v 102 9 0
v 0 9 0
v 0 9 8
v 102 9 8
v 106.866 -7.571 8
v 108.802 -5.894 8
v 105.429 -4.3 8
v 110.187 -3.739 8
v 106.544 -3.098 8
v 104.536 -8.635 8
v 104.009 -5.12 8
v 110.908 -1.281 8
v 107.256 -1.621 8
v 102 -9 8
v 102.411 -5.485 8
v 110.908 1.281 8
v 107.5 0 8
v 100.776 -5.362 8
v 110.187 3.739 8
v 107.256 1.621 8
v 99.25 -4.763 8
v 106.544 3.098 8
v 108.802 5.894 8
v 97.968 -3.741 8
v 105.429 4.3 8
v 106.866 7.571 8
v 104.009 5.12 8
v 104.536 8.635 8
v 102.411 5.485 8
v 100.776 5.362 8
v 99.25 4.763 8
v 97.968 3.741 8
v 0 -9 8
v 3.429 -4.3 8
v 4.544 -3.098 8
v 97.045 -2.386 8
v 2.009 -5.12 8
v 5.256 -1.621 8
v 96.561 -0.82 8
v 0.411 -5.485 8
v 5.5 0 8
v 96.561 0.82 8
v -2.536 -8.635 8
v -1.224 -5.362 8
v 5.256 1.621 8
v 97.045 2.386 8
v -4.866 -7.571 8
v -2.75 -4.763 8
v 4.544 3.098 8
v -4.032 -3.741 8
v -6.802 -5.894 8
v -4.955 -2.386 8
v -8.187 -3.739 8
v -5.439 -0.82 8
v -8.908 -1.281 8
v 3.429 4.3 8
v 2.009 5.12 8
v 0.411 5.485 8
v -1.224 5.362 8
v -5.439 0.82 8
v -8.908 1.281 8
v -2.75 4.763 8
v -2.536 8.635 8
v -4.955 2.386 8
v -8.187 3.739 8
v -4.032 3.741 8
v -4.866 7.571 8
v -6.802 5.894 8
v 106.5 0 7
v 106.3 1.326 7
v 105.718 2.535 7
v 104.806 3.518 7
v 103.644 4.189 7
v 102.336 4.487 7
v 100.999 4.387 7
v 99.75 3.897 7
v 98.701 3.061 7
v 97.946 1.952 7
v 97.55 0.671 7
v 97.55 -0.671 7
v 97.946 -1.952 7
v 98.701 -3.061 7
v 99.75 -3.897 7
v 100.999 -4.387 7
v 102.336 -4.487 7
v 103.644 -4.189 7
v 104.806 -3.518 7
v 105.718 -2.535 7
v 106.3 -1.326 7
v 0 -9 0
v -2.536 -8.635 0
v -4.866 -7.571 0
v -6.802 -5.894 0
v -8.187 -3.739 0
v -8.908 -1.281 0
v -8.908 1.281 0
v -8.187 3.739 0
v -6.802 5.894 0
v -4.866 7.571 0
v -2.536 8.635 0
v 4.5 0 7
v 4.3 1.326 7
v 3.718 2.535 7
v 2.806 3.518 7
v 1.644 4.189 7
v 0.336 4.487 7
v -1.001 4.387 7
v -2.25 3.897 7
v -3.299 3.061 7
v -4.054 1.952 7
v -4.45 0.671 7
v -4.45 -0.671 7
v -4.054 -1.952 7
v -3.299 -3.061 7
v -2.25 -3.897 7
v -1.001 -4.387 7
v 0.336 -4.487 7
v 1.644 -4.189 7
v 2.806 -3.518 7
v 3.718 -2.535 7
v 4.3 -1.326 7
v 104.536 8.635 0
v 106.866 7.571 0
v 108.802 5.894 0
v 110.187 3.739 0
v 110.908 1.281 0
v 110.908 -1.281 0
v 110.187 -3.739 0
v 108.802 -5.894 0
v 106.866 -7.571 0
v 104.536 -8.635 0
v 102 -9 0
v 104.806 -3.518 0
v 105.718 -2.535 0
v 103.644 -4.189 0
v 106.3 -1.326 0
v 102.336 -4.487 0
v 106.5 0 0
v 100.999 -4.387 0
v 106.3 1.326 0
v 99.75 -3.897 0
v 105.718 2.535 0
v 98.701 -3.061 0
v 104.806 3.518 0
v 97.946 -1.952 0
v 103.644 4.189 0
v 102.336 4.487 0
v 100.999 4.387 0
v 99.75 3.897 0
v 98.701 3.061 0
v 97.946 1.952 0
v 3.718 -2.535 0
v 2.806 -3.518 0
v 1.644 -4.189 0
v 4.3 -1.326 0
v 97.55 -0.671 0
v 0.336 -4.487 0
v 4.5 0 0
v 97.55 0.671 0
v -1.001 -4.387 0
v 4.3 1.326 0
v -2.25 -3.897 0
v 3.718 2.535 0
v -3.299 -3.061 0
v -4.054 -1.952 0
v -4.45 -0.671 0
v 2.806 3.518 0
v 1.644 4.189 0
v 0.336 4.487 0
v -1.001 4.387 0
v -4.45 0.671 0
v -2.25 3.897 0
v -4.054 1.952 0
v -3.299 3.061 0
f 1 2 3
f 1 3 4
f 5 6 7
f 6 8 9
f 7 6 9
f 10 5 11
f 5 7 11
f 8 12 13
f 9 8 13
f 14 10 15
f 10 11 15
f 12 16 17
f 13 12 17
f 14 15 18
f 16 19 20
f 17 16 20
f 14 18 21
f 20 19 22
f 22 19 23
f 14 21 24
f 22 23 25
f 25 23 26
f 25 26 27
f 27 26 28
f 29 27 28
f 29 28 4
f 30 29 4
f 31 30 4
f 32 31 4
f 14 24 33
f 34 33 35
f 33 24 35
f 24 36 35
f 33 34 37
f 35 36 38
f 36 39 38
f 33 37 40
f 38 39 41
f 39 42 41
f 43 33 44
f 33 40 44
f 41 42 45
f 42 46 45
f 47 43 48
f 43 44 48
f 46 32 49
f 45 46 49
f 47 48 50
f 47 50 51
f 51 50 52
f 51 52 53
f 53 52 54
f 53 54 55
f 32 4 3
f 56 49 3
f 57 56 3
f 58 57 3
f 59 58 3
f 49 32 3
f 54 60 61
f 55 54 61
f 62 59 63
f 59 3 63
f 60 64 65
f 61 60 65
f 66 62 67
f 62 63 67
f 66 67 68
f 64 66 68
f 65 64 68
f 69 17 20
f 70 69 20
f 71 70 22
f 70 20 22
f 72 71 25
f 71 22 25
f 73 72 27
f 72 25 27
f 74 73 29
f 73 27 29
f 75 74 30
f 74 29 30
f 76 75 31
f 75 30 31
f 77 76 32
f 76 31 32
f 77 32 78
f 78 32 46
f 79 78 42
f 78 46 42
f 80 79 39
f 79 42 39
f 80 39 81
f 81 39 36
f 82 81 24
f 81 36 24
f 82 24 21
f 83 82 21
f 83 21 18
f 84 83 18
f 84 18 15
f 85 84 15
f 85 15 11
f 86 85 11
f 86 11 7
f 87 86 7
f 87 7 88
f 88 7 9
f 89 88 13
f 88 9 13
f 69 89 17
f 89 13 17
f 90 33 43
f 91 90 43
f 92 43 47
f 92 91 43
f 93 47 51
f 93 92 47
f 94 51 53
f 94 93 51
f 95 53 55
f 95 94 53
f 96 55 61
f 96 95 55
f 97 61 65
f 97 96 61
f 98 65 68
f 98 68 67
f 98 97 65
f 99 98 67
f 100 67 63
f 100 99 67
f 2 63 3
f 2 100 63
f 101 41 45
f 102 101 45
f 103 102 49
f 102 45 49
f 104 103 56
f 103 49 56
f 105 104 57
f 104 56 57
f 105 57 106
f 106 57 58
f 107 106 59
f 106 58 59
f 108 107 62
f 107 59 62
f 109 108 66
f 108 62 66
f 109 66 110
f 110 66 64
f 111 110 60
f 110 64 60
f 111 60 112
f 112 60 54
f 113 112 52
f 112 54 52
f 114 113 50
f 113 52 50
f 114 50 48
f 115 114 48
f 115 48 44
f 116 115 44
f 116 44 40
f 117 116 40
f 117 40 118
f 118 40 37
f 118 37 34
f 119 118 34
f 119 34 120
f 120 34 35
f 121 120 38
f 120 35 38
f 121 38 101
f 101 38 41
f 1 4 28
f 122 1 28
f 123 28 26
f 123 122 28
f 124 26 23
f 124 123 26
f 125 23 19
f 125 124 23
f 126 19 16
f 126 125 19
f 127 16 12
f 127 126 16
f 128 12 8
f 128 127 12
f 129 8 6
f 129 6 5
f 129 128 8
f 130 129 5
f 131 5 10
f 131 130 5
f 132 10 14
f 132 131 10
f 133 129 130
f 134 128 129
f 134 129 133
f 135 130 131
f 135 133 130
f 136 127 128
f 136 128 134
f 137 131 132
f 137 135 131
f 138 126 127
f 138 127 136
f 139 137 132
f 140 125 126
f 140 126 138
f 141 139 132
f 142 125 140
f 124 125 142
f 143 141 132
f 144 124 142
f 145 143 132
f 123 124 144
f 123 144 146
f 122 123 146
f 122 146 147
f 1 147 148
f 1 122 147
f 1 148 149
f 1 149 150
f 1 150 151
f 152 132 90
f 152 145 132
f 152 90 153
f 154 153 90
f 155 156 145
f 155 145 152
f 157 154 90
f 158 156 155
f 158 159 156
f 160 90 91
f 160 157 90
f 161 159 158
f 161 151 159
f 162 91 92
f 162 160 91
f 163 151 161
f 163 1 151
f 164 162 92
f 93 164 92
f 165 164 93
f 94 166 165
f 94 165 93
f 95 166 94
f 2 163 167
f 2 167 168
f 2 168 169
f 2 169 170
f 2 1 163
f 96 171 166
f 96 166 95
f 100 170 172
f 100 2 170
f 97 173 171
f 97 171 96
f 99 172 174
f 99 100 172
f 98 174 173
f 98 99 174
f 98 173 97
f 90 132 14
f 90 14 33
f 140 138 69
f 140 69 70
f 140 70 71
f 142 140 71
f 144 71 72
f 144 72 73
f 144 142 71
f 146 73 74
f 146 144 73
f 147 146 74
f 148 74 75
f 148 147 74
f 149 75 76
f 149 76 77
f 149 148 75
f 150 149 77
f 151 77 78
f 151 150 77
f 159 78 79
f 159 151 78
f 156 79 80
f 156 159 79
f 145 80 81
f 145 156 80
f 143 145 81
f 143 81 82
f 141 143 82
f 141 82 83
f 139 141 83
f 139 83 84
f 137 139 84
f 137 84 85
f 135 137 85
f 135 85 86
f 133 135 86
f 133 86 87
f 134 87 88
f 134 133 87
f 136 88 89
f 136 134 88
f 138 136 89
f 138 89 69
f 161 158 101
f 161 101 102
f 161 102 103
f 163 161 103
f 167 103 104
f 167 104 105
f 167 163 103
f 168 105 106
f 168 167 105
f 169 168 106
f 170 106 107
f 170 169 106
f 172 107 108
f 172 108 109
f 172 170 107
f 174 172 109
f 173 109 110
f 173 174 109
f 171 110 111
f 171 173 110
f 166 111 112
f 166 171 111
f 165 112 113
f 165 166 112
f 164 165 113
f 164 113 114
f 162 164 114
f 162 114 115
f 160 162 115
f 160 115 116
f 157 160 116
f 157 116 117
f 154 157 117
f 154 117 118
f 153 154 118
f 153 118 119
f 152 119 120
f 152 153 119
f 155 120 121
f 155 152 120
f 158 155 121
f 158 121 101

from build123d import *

# Parameters (mm, degrees)
SKETCH1_R           = 4.5
BOSS_EXTRUDE1_DEPTH = 8
CHAMFER1_SIZE       = 1


with BuildPart() as part:
    # Sketch1 → Boss-Extrude1 (new body)
    with BuildSketch(Plane.XY):
        with BuildLine():
            Line((0, 9), (102, 9))
            ThreePointArc((102, 9), (111, 0), (102, -9))
            Line((102, -9), (0, -9))
            ThreePointArc((0, -9), (-9, 0), (0, 9))
        make_face()
        Circle(SKETCH1_R, mode=Mode.SUBTRACT)
        with Locations((102, 0)):
            Circle(SKETCH1_R, mode=Mode.SUBTRACT)
    extrude(amount=BOSS_EXTRUDE1_DEPTH)

    # Chamfer1
    chamfer1_edges = [part.edges().sort_by_distance(p)[0] for p in [
        (-4.5, 0, 8),
        (97.5, 0, 8),
    ]]
    chamfer(chamfer1_edges, length=CHAMFER1_SIZE)


solid = part.part
